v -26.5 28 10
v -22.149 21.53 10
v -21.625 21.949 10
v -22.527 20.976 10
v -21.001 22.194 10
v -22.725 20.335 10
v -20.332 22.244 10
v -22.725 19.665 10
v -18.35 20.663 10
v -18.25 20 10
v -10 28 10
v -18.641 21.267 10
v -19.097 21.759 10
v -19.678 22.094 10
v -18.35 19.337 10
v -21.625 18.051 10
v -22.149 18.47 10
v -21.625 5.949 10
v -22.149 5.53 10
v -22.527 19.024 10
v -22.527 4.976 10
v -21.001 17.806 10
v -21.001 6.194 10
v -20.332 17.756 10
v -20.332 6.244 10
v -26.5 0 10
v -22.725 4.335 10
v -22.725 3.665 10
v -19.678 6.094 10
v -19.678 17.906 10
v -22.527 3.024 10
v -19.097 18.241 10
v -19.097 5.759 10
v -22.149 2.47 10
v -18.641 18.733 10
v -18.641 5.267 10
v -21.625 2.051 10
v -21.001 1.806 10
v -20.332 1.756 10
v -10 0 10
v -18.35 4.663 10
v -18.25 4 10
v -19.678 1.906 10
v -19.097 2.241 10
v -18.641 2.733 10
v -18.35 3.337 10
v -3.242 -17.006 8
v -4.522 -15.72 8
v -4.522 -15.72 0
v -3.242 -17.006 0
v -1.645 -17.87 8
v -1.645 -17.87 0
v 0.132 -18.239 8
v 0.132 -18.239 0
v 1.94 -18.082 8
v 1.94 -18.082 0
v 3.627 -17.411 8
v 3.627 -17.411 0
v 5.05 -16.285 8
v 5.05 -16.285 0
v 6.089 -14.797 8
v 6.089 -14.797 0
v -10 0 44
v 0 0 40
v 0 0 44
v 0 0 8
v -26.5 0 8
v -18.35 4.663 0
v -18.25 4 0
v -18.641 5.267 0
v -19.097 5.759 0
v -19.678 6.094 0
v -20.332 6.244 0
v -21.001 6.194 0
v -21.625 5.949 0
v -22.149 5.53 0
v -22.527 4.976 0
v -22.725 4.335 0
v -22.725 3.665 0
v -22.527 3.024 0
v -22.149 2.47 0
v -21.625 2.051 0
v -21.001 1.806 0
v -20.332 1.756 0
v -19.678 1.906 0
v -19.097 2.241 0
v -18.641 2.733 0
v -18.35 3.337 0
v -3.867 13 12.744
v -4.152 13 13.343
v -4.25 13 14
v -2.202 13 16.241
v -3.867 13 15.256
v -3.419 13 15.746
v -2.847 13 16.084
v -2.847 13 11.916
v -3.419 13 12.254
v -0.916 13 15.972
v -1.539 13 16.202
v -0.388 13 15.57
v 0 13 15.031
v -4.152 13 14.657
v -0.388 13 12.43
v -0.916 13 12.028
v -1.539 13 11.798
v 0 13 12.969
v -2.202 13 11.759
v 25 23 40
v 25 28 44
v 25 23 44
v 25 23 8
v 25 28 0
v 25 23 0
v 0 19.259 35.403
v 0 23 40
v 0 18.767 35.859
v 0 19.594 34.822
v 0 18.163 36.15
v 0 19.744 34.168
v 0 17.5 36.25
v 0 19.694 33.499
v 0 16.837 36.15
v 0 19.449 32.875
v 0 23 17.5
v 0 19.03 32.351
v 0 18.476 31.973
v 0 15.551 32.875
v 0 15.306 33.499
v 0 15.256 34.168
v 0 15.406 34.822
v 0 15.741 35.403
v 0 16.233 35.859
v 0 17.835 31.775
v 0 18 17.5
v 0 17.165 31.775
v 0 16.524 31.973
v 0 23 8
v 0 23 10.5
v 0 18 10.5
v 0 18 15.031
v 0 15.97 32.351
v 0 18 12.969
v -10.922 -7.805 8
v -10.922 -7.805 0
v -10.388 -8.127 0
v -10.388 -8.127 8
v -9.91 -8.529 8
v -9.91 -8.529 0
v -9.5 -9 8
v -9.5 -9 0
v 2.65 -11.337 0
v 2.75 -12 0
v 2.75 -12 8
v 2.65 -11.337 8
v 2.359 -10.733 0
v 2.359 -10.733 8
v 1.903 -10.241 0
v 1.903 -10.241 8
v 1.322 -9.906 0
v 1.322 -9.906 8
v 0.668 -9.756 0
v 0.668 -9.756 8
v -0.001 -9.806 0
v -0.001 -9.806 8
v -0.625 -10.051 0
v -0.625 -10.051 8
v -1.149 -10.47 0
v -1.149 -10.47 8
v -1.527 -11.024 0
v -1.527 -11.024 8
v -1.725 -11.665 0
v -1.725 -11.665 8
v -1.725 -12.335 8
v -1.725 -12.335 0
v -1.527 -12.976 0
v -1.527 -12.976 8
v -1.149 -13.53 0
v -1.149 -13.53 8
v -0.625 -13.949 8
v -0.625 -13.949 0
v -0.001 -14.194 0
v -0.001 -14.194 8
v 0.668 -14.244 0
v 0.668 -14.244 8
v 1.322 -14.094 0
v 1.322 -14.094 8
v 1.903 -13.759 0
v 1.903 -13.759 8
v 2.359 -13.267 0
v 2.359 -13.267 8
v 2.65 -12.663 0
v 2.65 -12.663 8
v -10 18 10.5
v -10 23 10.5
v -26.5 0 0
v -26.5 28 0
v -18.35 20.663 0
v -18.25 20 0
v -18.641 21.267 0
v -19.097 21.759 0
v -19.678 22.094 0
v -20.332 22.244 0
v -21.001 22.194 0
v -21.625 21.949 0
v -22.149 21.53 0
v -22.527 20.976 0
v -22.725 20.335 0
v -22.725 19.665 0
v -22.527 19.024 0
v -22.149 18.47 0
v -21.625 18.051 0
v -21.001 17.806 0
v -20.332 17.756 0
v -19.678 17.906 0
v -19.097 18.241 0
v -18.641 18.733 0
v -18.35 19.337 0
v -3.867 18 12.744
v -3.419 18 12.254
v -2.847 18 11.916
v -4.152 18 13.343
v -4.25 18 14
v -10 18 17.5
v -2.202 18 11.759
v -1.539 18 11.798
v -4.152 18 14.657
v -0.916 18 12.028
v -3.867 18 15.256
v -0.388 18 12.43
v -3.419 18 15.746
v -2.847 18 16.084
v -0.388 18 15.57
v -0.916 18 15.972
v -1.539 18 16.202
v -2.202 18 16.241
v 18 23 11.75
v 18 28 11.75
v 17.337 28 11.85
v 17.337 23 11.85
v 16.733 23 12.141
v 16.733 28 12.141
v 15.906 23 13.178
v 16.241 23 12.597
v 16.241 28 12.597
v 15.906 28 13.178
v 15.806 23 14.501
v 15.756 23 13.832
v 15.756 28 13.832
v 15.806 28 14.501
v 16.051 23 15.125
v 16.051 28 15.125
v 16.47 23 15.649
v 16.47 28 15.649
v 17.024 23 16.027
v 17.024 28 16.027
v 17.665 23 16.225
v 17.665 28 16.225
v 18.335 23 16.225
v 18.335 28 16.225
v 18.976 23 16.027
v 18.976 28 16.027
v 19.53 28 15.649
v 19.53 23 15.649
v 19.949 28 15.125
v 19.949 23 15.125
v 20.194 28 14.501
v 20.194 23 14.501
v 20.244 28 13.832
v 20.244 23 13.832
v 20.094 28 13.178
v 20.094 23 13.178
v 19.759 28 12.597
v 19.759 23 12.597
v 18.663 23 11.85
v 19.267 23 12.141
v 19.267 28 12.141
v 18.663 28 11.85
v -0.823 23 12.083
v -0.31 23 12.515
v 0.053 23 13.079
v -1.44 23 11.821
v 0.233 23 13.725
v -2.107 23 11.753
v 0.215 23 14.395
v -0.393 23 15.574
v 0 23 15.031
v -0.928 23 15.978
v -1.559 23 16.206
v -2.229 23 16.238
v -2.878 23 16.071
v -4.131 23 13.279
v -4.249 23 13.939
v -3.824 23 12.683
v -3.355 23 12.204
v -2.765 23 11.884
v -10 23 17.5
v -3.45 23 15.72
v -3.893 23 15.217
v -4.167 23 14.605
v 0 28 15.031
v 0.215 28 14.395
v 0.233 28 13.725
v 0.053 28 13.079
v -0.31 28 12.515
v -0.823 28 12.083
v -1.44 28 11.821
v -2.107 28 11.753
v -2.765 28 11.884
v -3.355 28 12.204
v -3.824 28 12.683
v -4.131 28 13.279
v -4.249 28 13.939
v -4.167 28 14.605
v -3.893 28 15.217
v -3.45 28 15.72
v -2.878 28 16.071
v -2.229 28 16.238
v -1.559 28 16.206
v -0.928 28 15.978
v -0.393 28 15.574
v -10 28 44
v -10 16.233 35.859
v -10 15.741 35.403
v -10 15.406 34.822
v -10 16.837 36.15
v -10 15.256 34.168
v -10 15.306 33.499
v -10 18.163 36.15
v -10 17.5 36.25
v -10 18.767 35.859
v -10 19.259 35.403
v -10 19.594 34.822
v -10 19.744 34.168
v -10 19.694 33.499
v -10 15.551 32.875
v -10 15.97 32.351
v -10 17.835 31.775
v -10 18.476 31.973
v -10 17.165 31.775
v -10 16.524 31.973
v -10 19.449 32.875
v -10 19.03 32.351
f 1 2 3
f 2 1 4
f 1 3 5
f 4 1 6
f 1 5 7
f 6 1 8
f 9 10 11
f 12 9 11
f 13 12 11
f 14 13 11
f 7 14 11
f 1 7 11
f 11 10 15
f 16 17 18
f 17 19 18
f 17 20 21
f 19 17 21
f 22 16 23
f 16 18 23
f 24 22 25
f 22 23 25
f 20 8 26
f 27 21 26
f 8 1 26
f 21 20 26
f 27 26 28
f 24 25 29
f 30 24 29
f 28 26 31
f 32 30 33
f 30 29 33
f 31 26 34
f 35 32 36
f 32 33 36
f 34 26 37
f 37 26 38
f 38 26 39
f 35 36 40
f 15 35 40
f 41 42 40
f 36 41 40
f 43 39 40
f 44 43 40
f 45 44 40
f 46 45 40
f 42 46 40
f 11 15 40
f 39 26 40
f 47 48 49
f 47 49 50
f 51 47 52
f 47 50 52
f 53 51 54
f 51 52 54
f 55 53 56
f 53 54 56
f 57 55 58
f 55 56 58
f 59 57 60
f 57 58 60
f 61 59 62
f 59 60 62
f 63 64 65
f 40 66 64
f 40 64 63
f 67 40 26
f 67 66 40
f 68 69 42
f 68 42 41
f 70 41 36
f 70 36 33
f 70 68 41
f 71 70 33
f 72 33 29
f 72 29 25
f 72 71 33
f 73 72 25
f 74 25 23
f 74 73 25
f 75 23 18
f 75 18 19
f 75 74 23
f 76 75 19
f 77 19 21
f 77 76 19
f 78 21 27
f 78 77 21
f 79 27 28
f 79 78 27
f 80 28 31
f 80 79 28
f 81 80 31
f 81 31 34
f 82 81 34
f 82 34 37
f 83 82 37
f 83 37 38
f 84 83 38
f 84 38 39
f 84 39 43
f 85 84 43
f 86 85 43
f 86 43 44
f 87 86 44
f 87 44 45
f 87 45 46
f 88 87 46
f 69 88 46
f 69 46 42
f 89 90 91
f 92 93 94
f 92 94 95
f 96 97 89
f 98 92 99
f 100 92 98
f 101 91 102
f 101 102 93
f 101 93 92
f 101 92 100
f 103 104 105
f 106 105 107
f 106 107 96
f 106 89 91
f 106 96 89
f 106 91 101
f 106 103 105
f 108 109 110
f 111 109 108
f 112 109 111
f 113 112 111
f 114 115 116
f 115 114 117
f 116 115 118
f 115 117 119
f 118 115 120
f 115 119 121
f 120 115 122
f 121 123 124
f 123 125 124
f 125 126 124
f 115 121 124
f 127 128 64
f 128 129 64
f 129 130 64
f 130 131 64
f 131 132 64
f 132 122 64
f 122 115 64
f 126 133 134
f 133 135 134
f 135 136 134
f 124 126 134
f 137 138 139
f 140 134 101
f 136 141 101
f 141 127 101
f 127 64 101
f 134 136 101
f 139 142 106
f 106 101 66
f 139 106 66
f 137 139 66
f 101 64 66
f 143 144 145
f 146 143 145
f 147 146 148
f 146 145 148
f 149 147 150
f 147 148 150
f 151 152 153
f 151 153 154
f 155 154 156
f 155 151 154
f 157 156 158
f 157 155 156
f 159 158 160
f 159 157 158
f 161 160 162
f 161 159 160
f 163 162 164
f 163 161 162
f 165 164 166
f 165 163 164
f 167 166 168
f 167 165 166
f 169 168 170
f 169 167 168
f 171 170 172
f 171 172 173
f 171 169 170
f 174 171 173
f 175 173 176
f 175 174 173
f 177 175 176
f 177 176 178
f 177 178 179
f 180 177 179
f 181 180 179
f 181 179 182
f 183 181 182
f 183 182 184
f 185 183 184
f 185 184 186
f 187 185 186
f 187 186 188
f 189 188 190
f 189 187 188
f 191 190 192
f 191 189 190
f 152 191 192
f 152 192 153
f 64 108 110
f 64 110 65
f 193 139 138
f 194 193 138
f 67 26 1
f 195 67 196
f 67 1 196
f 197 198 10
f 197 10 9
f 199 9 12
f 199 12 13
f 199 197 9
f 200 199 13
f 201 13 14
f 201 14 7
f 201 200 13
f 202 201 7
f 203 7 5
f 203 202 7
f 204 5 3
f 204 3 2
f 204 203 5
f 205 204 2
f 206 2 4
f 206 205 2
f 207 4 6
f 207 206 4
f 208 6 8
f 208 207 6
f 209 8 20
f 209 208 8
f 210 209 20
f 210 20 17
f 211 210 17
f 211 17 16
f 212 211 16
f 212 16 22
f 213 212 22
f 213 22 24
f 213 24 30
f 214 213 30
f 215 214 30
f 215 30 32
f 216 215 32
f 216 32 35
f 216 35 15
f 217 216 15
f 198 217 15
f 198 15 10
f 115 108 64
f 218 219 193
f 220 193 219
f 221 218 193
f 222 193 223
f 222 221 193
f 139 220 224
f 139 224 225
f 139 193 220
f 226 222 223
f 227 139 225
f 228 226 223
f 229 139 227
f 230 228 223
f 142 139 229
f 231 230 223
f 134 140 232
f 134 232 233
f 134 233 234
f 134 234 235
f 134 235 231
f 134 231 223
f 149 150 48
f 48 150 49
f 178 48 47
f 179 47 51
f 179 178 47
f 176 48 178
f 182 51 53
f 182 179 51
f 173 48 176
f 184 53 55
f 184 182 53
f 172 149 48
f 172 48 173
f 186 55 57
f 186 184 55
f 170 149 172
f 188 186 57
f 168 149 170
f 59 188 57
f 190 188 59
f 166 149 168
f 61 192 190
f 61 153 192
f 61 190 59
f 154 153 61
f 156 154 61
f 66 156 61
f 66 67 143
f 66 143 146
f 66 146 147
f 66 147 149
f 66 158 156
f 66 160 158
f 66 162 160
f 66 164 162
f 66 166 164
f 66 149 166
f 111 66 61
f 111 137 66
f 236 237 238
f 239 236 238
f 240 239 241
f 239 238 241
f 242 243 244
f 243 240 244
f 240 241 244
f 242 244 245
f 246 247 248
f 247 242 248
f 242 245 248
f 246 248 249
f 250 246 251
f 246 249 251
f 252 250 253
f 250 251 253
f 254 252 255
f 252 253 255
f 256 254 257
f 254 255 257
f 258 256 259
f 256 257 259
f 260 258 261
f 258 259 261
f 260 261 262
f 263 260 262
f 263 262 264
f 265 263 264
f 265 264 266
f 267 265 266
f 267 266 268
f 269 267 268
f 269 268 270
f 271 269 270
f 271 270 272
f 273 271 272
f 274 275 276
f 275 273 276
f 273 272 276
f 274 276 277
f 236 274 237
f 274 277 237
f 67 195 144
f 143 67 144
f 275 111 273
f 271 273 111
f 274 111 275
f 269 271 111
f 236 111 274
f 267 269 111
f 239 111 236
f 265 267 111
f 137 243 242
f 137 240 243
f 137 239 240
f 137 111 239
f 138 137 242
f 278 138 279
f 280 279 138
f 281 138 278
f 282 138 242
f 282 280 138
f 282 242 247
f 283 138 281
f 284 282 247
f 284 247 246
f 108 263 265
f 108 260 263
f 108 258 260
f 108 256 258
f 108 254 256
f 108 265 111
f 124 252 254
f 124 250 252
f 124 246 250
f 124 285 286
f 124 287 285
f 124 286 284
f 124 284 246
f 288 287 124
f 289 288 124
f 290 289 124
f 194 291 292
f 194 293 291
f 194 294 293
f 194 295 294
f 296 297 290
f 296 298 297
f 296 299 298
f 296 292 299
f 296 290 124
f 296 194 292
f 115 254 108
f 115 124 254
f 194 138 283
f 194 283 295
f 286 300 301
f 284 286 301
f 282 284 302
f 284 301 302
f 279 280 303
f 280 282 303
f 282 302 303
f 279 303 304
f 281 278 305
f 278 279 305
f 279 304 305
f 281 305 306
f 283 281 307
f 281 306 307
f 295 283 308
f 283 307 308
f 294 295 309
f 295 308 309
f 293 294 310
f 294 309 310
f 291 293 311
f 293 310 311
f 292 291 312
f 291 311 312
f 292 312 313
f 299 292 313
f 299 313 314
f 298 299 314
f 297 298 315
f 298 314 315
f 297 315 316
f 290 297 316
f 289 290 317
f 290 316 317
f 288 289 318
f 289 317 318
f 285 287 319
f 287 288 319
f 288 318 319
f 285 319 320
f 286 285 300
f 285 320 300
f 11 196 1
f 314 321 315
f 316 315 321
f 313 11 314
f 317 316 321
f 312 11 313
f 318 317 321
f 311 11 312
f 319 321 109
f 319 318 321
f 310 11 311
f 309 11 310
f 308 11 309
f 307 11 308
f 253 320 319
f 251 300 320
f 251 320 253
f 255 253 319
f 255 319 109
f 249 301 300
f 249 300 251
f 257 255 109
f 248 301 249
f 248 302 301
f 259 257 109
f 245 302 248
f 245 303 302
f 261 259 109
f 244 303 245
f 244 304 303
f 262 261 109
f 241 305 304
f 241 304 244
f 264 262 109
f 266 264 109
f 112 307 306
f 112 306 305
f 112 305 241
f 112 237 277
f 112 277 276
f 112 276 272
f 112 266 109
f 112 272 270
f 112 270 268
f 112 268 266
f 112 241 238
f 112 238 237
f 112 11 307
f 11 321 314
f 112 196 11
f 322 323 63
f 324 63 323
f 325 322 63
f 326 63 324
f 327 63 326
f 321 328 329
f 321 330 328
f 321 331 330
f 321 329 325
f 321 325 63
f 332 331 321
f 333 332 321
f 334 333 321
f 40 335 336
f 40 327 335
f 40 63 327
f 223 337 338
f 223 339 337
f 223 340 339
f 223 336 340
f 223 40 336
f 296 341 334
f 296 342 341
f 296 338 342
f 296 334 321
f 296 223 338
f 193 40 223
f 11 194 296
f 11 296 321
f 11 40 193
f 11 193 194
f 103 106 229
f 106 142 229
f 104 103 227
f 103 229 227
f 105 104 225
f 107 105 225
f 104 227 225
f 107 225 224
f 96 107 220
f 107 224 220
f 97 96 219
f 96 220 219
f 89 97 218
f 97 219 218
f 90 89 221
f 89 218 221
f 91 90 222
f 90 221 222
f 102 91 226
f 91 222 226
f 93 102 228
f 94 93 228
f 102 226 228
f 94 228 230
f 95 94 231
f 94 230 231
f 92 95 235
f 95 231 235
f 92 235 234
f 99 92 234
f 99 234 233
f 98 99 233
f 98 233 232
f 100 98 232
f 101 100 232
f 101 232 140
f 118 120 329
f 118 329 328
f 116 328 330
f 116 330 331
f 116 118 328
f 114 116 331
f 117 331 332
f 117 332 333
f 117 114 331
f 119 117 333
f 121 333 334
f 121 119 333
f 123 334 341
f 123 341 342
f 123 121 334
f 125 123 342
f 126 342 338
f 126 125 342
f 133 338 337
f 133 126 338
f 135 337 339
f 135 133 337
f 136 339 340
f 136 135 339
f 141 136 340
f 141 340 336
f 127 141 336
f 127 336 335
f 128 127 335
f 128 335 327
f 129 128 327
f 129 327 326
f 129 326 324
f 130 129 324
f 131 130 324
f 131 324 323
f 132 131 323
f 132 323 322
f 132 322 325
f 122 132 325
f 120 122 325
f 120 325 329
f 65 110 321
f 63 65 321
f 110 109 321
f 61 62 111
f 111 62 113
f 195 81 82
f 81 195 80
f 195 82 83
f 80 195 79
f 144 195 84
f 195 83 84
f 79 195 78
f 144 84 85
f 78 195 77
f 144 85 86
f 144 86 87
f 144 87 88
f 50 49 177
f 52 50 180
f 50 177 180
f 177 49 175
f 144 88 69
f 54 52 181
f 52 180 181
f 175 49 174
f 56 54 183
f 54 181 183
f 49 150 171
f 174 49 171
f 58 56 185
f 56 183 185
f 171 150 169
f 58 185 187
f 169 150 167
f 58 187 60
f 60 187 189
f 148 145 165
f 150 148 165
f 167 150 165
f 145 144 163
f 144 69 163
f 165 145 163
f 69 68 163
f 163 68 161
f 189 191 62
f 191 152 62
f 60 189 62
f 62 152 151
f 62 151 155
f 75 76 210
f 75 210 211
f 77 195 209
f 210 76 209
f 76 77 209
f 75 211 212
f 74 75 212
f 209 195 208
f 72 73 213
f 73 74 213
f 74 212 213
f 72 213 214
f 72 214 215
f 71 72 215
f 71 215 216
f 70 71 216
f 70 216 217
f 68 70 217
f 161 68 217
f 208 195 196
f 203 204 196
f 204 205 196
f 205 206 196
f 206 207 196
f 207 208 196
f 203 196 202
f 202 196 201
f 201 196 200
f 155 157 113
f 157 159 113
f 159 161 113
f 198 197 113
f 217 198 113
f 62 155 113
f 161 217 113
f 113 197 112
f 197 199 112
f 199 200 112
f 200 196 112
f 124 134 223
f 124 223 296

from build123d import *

# Parameters (mm, degrees)
BOSS_EXTRUDE1_DEPTH     = 28
BOSS_EXTRUDE2_DEPTH     = 12
SKETCH3_R               = 2.25
CUT_EXTRUDE1_DEPTH      = 62.565006294
SKETCH4_R               = 2.25
CUT_EXTRUDE2_DEPTH      = 56.554027757
SKETCH5_W               = 40
SKETCH5_H               = 5
BOSS_EXTRUDE3_DEPTH     = 25
CUT_EXTRUDE3_DEPTH      = 10
CUT_EXTRUDE3_DEPTH_BACK = 54.209491634
SKETCH6_R               = 2.25
SKETCH7_W               = 7
SKETCH7_H               = 5
CUT_EXTRUDE4_DEPTH      = 10
SKETCH8_R               = 2.25
BOSS_EXTRUDE4_DEPTH     = 8
BOSS_EXTRUDE6_DEPTH     = 4
SKETCH10_W              = 8
SKETCH10_H              = 28
CUT_EXTRUDE5_DEPTH      = 66.423619588


with BuildPart() as part:
    # Sketch1 → Boss-Extrude1 (new body)
    with BuildSketch(Plane(origin=(0, 0, 0), x_dir=(1, 0, 0), z_dir=(0, 1, 0))):
        Polygon((0, 0), (-26.5, 0), (-26.5, 10), (-10, 10), (-10, 40), (0, 40), align=None)
    extrude(amount=BOSS_EXTRUDE1_DEPTH)

    # Sketch2 → Boss-Extrude2 (add)
    with BuildSketch(Plane.ZY.offset(26.5)):
        with BuildLine():
            Line((0, 28), (0, 0))
            Line((0, 0), (8, 0))
            Line((8, 0), (8, 8))
            ThreePointArc((8, 8), (4, 12), (8, 16))
            Line((8, 16), (8, 28))
            Line((8, 28), (0, 28))
        make_face()
    extrude(amount=-BOSS_EXTRUDE2_DEPTH)

    # Sketch3 → Cut-Extrude1 (cut, through all)
    with BuildSketch(Plane.XY.offset(8)):
        with Locations((-20.5, 20)):
            Circle(SKETCH3_R)
        with Locations((-20.5, 4)):
            Circle(SKETCH3_R)
    extrude(amount=-CUT_EXTRUDE1_DEPTH, mode=Mode.SUBTRACT)

    # Sketch4 → Cut-Extrude2 (cut, through all)
    with BuildSketch(Plane(origin=(0, 0, 0), x_dir=(0, 0, -1), z_dir=(1, 0, 0))):
        with Locations((34, 17.5)):
            Circle(SKETCH4_R)
    extrude(amount=-CUT_EXTRUDE2_DEPTH, mode=Mode.SUBTRACT)

    # Sketch5 → Boss-Extrude3 (add)
    with BuildSketch(Plane(origin=(0, 0, 0), x_dir=(0, 0, -1), z_dir=(1, 0, 0))):
        with Locations((20, 25.5)):
            Rectangle(SKETCH5_W, SKETCH5_H)
    extrude(amount=BOSS_EXTRUDE3_DEPTH)

    # Sketch6 → Cut-Extrude3 (cut, two sides: drawn at the far end of the back side and taken through both)
    with BuildSketch(Plane.XZ.offset(-23).offset(-CUT_EXTRUDE3_DEPTH_BACK)):
        with Locations(Location((-2, -14, 0), (0, 0, 332.733955549))):
            Circle(SKETCH6_R)
        with Locations(Location((18, -14, 0), (0, 0, 90))):
            Circle(SKETCH6_R)
    extrude(amount=CUT_EXTRUDE3_DEPTH + CUT_EXTRUDE3_DEPTH_BACK, mode=Mode.SUBTRACT)

    # Sketch7 → Cut-Extrude4 (cut)
    with BuildSketch(Plane(origin=(0, 0, 0), x_dir=(0, 0, -1), z_dir=(1, 0, 0))):
        with Locations((14, 20.5)):
            Rectangle(SKETCH7_W, SKETCH7_H)
    extrude(amount=-CUT_EXTRUDE4_DEPTH, mode=Mode.SUBTRACT)

    # Sketch8 → Boss-Extrude4 (add)
    with BuildSketch(Plane.XY):
        with BuildLine():
            Line((-9.5, -9), (-4.52228171, -15.720105701))
            ThreePointArc((-4.52228171, -15.720105701), (1.041905897, -18.22646272), (6.089442895, -14.796538598))
            Line((6.089442895, -14.796538598), (25, 23))
            Line((25, 23), (0, 23))
            Line((0, 23), (0, 0))
            Line((0, 0), (-26.5, 0))
            Line((-26.5, 0), (-10.922493011, -7.804616818))
            ThreePointArc((-10.922493011, -7.804616818), (-10.14087473, -8.318566759), (-9.5, -9))
        make_face()
        with Locations((0.5, -12)):
            Circle(SKETCH8_R, mode=Mode.SUBTRACT)
    extrude(amount=-BOSS_EXTRUDE4_DEPTH)

    # Sketch9 → Boss-Extrude6 (add)
    with BuildSketch(Plane(origin=(0, 0, -40), x_dir=(-1, 0, 0), z_dir=(0, 0, -1))):
        Polygon((-25, 23), (0, 0), (10, 0), (10, 28), (-25, 28), align=None)
    extrude(amount=BOSS_EXTRUDE6_DEPTH)

    # Sketch10 → Cut-Extrude5 (cut, through all)
    with BuildSketch(Plane(origin=(-14.5, 0, 0), x_dir=(0, 0, -1), z_dir=(1, 0, 0))):
        with Locations((-4, 14)):
            Rectangle(SKETCH10_W, SKETCH10_H)
    extrude(amount=-CUT_EXTRUDE5_DEPTH, mode=Mode.SUBTRACT)


with BuildPart() as body_2:
    # Mirror1: mirrored copy
    add(part.part.mirror(Plane(origin=(0, 28, 0), x_dir=(1, 0, 0), z_dir=(0, 0, -1))))


solid = body_2.part
